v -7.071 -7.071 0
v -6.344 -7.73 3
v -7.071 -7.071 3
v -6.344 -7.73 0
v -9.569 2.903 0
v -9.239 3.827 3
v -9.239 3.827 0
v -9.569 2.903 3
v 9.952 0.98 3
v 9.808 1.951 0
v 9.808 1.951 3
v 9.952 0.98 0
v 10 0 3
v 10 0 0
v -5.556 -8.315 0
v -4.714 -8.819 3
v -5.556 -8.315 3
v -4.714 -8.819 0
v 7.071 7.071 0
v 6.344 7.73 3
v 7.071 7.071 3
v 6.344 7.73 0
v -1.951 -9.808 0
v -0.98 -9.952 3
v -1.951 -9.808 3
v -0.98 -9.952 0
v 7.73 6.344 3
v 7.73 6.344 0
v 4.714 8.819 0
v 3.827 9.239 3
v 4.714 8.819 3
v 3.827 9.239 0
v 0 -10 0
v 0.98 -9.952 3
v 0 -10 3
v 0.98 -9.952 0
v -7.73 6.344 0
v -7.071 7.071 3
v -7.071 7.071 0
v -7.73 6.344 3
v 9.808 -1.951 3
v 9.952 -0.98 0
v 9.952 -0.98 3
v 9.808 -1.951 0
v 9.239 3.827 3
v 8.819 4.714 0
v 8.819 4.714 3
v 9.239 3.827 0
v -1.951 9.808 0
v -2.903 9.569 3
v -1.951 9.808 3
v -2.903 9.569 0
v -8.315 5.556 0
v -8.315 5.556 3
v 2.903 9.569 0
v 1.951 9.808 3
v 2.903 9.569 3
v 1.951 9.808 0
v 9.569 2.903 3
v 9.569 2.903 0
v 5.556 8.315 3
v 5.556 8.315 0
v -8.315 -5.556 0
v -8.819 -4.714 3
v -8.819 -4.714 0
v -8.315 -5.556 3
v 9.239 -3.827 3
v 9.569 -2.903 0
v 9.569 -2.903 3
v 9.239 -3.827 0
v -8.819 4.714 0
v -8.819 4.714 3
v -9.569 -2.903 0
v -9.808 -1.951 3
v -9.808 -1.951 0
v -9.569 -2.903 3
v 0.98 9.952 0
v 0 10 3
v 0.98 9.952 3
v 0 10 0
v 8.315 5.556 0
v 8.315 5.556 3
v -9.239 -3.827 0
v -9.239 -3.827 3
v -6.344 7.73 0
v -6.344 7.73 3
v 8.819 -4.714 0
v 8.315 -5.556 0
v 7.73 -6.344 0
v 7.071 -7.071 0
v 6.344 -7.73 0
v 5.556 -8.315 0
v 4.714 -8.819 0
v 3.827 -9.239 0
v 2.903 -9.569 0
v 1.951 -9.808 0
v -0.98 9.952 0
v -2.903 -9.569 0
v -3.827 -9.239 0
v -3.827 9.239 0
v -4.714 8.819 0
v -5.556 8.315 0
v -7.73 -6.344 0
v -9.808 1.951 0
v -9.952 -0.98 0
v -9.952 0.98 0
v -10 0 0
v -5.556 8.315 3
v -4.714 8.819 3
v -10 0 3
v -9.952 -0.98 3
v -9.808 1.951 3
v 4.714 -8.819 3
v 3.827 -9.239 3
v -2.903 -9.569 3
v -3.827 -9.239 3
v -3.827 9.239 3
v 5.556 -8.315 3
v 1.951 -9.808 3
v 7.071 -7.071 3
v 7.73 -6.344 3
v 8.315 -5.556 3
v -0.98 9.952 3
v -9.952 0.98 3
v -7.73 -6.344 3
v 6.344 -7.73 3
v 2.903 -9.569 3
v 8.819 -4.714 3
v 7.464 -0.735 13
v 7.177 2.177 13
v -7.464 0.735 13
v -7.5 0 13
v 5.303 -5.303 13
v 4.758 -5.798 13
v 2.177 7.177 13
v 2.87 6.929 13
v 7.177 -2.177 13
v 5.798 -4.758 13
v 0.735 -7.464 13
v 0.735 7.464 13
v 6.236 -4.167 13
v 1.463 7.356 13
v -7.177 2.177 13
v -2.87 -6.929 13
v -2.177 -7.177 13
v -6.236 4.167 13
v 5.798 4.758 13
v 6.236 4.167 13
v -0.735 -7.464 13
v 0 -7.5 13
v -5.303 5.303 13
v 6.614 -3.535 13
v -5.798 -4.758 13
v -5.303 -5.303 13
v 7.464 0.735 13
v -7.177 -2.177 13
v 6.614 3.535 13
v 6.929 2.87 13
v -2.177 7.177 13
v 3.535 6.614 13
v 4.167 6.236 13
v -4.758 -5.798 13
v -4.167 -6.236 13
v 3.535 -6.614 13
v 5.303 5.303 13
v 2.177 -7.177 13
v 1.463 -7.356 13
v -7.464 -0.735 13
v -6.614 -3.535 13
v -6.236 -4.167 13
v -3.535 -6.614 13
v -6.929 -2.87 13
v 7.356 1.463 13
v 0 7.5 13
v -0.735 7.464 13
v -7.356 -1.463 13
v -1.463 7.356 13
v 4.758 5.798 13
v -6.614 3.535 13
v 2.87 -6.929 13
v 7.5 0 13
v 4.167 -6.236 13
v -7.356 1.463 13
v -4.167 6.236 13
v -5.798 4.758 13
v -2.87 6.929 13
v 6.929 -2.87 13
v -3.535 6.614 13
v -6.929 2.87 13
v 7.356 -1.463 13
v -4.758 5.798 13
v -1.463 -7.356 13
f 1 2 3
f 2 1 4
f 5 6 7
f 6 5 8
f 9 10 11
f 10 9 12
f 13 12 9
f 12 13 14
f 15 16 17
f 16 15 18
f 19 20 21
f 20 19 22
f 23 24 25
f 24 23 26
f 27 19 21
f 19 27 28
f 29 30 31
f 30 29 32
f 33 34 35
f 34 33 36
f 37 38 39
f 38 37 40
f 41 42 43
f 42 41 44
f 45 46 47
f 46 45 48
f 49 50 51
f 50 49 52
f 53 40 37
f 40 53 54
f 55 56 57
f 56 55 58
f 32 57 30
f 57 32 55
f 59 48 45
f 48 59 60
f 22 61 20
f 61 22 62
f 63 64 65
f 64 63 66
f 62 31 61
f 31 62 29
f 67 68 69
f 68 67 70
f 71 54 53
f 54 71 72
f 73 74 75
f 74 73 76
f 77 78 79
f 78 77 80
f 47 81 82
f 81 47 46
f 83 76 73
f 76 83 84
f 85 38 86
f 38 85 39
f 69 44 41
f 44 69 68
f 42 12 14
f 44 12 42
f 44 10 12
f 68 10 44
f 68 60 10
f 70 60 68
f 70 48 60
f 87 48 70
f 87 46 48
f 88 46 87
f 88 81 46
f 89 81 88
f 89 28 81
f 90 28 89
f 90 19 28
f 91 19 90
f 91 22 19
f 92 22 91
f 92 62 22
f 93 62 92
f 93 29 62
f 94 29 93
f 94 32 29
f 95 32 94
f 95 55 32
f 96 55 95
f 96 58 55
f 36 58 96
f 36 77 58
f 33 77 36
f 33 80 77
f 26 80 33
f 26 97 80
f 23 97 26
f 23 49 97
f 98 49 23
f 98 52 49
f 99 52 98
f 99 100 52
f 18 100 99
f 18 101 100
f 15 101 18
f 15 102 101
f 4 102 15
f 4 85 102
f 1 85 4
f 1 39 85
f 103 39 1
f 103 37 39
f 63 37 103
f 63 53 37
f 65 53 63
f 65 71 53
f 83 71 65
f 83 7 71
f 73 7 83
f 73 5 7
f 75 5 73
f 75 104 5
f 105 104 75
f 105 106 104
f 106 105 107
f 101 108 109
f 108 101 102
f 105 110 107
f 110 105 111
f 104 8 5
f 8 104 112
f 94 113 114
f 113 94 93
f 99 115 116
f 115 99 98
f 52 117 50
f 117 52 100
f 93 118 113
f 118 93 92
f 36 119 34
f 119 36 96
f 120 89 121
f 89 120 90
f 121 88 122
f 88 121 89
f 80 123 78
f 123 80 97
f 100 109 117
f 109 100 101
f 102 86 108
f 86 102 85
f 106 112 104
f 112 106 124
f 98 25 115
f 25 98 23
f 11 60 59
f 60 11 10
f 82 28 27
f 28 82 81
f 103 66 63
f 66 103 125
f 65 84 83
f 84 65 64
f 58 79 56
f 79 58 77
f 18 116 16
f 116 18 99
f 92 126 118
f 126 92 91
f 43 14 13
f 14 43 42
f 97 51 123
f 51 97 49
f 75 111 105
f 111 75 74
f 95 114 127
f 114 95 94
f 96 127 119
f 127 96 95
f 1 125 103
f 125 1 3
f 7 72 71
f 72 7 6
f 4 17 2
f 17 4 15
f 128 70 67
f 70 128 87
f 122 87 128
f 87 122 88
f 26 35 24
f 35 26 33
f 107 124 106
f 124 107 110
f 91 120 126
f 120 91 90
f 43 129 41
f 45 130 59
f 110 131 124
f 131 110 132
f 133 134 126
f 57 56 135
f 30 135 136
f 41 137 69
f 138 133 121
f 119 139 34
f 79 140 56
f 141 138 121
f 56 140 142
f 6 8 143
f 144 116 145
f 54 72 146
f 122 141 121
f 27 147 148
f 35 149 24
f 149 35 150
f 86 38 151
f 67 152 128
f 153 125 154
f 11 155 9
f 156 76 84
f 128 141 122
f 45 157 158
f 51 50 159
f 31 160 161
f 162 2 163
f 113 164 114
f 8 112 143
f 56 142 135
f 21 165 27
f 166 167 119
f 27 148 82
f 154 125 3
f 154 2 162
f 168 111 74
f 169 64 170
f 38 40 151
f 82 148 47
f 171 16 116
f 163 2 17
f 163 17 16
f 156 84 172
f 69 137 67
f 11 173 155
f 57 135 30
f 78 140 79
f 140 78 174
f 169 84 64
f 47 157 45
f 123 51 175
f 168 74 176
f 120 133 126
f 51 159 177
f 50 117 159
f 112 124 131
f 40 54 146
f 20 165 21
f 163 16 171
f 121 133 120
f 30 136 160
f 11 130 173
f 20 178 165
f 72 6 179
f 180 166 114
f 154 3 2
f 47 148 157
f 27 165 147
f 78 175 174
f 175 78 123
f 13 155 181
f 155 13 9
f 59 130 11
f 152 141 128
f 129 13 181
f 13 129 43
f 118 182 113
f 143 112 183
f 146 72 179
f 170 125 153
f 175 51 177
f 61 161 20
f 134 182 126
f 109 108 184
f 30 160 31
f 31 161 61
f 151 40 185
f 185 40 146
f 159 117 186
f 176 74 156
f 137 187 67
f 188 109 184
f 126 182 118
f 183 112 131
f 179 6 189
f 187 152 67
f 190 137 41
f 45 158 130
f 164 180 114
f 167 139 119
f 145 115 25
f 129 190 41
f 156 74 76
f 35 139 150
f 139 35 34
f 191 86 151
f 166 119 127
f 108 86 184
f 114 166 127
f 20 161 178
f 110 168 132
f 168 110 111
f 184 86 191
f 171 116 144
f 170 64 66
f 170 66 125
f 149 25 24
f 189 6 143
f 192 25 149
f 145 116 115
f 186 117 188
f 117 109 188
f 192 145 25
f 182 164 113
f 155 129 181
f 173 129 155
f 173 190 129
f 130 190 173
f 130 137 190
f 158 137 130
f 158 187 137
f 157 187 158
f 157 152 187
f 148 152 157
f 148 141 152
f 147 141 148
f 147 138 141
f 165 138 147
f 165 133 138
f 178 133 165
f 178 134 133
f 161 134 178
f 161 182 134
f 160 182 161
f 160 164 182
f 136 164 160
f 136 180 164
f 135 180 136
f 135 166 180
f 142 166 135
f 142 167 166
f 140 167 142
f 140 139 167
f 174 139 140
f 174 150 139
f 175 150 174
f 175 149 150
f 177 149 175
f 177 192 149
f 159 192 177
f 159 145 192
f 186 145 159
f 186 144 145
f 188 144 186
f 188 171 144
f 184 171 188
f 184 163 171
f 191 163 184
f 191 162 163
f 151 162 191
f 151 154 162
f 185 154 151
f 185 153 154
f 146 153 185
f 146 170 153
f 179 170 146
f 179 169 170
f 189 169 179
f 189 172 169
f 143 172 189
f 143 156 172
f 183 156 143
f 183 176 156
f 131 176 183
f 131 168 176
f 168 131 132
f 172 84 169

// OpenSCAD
$fn = 64;

h1 = 3;
h2 = 10;

d1 = 20;
d2 = 15;

cylinder(d = d1, h = h1);

translate([0, 0, h1]) {
  cylinder(d1 = d1, d2 = d2, h = h2);
}
